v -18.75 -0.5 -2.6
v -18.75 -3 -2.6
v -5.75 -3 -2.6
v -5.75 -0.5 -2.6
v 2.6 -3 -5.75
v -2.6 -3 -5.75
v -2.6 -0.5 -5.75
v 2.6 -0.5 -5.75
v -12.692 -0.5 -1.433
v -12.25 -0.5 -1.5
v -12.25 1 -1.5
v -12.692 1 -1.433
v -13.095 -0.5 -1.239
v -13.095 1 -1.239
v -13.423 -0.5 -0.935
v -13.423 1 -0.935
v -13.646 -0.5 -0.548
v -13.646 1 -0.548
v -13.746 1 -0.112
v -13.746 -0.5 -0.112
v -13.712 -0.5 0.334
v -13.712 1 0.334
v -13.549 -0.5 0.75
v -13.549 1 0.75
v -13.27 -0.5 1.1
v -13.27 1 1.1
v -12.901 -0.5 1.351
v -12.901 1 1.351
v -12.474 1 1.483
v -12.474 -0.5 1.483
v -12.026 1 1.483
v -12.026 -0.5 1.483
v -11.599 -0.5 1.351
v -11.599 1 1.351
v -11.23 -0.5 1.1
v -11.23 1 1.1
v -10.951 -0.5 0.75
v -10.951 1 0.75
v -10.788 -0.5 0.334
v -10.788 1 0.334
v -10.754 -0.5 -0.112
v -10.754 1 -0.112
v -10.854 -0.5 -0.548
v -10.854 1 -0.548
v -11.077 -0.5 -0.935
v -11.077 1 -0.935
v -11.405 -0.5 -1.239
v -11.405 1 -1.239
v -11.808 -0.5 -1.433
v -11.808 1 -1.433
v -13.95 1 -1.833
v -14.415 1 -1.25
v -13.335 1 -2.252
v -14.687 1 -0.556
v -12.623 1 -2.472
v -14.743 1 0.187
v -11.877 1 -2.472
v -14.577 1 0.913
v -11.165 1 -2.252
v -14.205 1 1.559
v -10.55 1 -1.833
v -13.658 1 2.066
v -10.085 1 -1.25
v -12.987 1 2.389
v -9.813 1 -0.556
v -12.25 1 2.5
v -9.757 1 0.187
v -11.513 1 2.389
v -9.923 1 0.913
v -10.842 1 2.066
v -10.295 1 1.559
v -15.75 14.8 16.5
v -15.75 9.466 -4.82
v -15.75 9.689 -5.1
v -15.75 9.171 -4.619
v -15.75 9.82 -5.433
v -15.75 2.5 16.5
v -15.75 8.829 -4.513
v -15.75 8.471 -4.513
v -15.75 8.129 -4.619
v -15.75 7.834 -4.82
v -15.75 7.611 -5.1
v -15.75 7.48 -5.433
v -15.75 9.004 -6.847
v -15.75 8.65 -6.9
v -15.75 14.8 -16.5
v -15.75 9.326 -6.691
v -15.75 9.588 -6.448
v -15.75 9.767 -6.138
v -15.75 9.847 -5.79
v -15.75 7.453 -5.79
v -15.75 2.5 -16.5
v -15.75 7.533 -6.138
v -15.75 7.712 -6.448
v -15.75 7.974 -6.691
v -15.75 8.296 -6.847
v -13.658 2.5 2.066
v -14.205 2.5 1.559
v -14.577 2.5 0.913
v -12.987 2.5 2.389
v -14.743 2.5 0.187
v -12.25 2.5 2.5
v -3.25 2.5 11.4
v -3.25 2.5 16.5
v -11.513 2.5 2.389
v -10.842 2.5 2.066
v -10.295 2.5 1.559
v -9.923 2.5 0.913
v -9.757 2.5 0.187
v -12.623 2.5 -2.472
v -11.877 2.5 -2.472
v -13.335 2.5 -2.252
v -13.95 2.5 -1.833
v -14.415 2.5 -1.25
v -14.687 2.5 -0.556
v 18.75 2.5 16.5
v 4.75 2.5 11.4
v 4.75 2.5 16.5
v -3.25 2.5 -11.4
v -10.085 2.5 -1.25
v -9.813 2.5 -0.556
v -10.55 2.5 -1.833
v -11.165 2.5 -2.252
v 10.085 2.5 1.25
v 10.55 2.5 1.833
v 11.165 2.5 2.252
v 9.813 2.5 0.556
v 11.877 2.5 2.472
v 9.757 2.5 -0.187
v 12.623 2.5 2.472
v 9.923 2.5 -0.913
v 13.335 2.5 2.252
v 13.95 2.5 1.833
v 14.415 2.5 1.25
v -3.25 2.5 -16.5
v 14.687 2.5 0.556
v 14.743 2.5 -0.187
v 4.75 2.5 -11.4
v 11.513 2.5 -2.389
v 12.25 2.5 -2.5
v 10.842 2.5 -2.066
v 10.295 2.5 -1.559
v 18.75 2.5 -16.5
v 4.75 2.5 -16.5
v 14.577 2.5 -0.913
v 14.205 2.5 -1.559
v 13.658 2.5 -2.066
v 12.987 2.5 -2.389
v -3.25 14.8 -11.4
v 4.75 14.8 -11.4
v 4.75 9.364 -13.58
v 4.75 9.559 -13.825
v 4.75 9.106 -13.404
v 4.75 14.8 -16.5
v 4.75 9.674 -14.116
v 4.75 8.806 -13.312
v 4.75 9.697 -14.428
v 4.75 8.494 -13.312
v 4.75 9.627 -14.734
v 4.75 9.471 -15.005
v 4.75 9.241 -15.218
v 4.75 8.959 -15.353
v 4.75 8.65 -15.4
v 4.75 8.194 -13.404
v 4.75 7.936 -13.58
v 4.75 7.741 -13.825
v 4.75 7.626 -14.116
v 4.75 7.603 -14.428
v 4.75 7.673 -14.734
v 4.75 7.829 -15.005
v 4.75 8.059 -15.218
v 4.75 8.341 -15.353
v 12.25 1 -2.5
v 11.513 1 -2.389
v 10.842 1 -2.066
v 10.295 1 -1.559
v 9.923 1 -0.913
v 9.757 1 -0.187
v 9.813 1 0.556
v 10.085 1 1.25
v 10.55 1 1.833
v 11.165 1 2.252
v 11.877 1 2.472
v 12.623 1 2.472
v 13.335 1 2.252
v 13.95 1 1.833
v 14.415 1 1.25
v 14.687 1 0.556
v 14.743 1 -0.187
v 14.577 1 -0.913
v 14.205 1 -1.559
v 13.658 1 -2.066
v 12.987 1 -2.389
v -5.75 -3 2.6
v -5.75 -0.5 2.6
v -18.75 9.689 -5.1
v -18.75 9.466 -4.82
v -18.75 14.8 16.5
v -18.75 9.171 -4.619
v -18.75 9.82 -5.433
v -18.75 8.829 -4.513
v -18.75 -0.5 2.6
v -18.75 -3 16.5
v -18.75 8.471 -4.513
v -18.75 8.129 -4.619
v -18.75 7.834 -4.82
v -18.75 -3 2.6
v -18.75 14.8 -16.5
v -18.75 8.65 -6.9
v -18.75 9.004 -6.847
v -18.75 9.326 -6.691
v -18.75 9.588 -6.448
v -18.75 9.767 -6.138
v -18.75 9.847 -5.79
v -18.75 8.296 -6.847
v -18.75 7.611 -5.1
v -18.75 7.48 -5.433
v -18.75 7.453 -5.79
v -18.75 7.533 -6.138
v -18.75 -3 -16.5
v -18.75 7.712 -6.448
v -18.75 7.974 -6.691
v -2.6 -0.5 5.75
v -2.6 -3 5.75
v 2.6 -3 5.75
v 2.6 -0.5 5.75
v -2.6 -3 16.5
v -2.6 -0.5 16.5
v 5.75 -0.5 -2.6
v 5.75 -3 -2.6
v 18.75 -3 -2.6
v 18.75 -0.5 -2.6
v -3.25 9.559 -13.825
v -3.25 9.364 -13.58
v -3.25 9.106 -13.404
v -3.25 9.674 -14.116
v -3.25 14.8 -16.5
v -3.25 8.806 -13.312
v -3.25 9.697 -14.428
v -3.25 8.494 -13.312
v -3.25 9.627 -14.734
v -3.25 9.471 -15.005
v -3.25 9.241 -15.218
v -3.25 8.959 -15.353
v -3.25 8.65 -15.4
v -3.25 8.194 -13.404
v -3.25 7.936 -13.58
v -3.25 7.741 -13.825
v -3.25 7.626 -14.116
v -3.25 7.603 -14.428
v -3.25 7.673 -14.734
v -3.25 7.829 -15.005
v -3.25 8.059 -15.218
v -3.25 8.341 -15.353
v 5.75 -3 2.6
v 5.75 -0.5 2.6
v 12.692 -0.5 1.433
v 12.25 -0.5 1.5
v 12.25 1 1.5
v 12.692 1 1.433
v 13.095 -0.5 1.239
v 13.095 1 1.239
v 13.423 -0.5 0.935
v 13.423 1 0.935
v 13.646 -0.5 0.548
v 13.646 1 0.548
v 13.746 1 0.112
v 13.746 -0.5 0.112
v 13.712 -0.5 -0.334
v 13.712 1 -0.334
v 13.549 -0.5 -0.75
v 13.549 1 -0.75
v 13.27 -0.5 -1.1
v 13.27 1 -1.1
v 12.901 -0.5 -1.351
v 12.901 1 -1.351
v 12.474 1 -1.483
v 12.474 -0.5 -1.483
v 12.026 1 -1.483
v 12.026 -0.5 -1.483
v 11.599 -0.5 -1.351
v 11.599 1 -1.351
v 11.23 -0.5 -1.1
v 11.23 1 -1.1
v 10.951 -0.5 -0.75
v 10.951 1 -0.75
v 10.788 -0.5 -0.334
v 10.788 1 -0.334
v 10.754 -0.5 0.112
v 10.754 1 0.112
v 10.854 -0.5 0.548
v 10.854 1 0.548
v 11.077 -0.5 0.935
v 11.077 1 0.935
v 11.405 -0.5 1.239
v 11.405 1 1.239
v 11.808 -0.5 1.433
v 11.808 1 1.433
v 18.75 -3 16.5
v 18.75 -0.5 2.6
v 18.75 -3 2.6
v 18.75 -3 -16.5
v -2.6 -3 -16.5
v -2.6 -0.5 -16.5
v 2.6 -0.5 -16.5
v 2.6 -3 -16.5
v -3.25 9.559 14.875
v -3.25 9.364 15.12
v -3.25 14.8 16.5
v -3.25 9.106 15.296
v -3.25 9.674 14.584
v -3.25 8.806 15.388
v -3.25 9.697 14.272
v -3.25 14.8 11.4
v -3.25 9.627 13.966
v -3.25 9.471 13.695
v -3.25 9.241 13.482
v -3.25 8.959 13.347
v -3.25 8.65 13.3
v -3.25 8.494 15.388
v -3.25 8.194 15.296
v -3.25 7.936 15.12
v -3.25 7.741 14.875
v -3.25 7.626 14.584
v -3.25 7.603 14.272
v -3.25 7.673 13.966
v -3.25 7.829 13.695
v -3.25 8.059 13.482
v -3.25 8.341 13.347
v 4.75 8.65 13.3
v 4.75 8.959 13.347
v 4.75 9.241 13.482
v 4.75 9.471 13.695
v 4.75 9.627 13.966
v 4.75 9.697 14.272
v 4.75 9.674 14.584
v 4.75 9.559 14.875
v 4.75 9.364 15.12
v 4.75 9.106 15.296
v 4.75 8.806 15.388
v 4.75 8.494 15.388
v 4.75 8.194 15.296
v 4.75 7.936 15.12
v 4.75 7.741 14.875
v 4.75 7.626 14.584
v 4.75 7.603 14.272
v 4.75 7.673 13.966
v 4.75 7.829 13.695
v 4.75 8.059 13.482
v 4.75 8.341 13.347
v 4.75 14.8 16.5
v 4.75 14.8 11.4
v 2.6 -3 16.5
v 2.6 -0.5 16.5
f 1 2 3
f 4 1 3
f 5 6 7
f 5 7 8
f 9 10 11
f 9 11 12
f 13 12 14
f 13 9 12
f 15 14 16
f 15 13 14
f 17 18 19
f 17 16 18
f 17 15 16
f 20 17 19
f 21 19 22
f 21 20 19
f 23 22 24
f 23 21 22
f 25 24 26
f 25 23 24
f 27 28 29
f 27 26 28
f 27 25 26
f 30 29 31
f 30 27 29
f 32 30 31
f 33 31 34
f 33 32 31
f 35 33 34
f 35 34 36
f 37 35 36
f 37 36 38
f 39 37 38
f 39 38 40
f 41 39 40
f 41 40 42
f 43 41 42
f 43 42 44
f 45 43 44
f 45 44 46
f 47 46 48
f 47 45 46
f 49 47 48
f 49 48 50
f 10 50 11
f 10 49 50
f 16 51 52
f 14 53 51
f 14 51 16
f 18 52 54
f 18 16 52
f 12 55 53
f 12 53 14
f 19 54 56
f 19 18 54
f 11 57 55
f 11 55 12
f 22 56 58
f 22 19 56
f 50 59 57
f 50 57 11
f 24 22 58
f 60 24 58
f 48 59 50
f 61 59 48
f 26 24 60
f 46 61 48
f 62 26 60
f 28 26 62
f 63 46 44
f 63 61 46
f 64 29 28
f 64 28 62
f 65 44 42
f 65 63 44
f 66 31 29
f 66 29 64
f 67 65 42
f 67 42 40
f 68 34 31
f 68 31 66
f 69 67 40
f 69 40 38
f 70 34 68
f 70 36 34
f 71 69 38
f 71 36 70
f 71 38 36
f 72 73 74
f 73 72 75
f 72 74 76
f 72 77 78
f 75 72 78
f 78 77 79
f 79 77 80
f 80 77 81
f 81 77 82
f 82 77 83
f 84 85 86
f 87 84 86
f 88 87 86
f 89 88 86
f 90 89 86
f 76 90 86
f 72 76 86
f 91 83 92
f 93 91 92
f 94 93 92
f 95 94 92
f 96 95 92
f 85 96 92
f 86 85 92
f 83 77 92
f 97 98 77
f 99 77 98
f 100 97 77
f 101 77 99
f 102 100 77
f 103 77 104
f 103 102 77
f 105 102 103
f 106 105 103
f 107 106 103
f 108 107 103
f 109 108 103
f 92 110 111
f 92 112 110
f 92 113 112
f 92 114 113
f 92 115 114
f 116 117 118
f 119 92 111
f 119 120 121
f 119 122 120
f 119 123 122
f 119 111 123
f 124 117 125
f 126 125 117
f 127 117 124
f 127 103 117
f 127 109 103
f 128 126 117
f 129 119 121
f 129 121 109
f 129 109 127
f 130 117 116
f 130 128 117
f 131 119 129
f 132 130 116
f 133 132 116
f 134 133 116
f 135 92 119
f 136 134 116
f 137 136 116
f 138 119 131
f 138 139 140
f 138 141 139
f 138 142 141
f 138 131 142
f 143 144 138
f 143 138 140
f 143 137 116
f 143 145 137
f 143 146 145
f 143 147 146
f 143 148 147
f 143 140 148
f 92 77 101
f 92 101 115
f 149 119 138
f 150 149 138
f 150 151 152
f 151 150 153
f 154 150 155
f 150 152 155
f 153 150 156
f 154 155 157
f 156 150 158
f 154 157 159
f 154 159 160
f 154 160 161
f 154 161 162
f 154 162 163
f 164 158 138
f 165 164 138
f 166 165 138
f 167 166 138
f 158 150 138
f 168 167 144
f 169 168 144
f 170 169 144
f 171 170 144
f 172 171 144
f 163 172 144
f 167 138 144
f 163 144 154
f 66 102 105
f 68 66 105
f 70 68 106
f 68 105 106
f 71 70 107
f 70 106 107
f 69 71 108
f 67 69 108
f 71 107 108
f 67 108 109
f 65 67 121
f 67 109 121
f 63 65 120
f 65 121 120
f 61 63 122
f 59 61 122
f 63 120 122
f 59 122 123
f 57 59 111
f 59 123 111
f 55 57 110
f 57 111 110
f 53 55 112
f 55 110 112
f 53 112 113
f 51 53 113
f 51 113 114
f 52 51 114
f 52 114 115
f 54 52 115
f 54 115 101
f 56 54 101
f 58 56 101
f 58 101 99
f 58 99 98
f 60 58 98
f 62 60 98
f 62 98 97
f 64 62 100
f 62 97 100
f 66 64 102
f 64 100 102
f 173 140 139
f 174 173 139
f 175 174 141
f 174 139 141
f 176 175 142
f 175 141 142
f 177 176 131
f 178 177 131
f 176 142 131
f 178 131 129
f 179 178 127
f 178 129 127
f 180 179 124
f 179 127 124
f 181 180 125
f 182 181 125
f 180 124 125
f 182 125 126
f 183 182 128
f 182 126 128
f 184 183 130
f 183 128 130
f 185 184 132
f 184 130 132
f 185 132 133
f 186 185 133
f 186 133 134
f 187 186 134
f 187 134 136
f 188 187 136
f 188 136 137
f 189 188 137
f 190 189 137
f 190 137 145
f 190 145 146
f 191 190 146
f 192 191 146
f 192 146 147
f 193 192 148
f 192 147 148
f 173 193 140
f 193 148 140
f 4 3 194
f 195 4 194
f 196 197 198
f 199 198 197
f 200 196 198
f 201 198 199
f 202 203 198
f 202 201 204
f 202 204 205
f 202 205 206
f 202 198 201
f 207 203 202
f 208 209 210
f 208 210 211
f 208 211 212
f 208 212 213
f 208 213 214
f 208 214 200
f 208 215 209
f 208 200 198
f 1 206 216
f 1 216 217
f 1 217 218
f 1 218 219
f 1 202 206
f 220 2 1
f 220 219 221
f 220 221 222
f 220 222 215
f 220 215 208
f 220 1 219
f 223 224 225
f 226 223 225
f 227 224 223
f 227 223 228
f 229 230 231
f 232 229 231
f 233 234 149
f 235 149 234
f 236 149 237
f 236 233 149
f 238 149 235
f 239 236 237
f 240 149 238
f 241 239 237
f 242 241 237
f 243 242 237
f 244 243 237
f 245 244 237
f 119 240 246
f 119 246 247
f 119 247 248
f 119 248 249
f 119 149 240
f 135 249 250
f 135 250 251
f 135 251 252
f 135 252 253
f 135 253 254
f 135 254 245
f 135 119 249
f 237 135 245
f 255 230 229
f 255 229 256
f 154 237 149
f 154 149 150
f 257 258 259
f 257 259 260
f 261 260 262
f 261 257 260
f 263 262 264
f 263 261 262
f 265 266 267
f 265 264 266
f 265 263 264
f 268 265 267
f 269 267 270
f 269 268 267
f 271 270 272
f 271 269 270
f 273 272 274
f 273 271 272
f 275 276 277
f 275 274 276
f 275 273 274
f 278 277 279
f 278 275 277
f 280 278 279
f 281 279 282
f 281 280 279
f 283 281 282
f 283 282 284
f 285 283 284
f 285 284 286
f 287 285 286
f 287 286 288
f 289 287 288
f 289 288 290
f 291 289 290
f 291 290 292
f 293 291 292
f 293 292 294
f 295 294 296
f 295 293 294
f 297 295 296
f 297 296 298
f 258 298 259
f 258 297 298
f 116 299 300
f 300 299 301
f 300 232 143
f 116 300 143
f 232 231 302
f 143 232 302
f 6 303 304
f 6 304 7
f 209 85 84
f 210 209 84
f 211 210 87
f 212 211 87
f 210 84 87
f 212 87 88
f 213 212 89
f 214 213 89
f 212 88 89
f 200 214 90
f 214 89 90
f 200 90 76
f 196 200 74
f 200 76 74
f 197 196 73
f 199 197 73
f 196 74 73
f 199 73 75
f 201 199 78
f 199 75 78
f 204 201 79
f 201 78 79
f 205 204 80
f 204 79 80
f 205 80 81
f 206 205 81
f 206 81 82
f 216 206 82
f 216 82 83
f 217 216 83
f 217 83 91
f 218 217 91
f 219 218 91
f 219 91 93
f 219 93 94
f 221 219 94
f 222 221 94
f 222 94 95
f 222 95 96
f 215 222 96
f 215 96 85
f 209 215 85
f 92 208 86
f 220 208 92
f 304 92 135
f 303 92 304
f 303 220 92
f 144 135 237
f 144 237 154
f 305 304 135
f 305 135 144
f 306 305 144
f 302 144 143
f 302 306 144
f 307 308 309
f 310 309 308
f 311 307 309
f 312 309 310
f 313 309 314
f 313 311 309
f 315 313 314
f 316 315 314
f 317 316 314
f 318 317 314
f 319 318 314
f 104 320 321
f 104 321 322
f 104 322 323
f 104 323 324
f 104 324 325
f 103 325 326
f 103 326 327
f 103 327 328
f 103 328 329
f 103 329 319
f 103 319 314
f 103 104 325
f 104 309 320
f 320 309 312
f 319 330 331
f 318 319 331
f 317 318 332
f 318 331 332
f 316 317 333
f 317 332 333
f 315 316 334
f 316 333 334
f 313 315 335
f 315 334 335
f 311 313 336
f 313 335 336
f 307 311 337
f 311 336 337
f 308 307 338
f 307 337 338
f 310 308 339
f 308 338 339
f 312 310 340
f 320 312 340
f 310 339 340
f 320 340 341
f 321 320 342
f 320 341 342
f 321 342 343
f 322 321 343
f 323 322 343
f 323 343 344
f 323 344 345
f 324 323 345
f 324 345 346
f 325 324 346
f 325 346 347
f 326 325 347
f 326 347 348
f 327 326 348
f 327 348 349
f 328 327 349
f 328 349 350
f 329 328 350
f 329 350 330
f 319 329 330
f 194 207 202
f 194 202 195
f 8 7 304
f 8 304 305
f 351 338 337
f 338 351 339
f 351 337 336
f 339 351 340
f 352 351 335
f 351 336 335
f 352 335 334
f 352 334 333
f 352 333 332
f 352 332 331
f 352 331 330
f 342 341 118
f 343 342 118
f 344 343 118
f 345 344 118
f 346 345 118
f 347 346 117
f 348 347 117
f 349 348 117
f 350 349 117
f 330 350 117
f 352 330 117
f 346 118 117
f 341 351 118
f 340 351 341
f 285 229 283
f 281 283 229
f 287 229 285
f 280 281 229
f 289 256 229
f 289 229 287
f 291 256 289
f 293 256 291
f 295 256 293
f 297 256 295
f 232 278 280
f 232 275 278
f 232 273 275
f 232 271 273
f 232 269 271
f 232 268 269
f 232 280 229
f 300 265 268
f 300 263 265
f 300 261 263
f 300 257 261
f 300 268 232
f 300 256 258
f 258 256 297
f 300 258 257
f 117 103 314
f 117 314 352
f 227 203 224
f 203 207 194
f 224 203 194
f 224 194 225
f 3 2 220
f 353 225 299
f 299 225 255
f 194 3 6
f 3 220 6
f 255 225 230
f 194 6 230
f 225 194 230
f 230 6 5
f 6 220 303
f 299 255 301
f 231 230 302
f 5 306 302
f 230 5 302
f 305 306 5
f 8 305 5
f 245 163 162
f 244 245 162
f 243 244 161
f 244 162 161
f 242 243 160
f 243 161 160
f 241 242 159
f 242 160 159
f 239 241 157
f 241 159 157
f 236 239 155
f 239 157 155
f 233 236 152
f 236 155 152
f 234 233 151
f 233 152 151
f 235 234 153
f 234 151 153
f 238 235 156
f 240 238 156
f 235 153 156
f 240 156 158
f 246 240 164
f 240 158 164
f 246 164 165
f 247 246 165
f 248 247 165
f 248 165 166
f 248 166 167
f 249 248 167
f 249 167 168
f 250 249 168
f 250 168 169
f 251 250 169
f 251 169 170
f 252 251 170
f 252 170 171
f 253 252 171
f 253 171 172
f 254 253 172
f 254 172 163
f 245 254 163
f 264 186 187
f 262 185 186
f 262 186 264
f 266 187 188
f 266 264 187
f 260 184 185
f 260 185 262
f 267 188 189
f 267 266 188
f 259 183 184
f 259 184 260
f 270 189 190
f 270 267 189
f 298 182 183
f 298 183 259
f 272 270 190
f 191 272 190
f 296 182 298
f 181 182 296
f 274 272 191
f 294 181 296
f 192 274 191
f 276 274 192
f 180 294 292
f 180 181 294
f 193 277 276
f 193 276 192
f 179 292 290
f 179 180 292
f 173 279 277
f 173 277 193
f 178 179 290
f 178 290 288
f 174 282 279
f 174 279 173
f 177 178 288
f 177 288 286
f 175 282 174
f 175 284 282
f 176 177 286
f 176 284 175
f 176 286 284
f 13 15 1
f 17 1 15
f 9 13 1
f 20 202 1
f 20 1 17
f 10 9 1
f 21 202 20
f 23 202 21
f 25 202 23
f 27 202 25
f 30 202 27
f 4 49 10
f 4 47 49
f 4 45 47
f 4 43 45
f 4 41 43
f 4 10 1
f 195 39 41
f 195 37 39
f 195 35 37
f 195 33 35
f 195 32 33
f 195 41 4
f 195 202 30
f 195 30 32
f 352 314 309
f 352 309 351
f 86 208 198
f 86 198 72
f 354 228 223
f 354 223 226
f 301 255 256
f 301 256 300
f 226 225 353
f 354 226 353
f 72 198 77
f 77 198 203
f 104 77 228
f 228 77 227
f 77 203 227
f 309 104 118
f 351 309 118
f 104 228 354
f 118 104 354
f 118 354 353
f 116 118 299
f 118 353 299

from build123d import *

# Parameters (mm, degrees)
AUFSATZ_LINEAR_AUSTRAGEN1_DEPTH      = 2.5
AUFSATZ_LINEAR_AUSTRAGEN1_DEPTH_BACK = 3
SKIZZE1_W                            = 37.5
SKIZZE1_H                            = 33
SKIZZE2_W                            = 3
SKIZZE2_H                            = 33
SKIZZE2_W_2                          = 8
SKIZZE2_H_2                          = 5.1
AUFSATZ_LINEAR_AUSTRAGEN2_DEPTH      = 12.3
SKIZZE5_R                            = 1.2
SCHNITT_LINEAR_AUSTRAGEN4_DEPTH      = 42.006584837
SKIZZE7_R                            = 1.05
SCHNITT_LINEAR_AUSTRAGEN5_DEPTH      = 10
SKIZZE8_W                            = 5.2
SKIZZE8_H                            = 13
SKIZZE8_W_2                          = 13
SKIZZE8_H_2                          = 5.2
SCHNITT_LINEAR_AUSTRAGEN6_DEPTH      = 2.5
SCHNITT_LINEAR_AUSTRAGEN7_DEPTH      = 30.031922086
SCHNITT_LINEAR_AUSTRAGEN7_DEPTH_BACK = 30.031922086
SKIZZE10_R                           = 1.5
SKIZZE13_R                           = 2.5
SCHNITT_LINEAR_AUSTRAGEN8_DEPTH      = 1.5


with BuildPart() as part:
    # Skizze1 → Aufsatz-Linear austragen1 (new, two sides: drawn at the far end of the back side and taken through both)
    with BuildSketch(Plane(origin=(0, 0, 0), x_dir=(1, 0, 0), z_dir=(0, 1, 0)).offset(-AUFSATZ_LINEAR_AUSTRAGEN1_DEPTH_BACK)):
        Rectangle(SKIZZE1_W, SKIZZE1_H)
    extrude(amount=AUFSATZ_LINEAR_AUSTRAGEN1_DEPTH + AUFSATZ_LINEAR_AUSTRAGEN1_DEPTH_BACK)

    # Skizze2 → Aufsatz-Linear austragen2 (add)
    with BuildSketch(Plane(origin=(0, 2.5, 0), x_dir=(1, 0, 0), z_dir=(0, 1, 0))):
        with Locations((-17.25, 0)):
            Rectangle(SKIZZE2_W, SKIZZE2_H)
        with Locations((0.75, -13.95)):
            Rectangle(SKIZZE2_W_2, SKIZZE2_H_2)
        with Locations((0.75, 13.95)):
            Rectangle(SKIZZE2_W_2, SKIZZE2_H_2)
    extrude(amount=AUFSATZ_LINEAR_AUSTRAGEN2_DEPTH)

    # Skizze5 → Schnitt-Linear austragen4 (cut, through all)
    with BuildSketch(Plane(origin=(-15.75, 0, 0), x_dir=(0, 0, -1), z_dir=(1, 0, 0))):
        with Locations((5.7, 8.65)):
            Circle(SKIZZE5_R)
    extrude(amount=-SCHNITT_LINEAR_AUSTRAGEN4_DEPTH, mode=Mode.SUBTRACT)

    # Skizze7 → Schnitt-Linear austragen5 (cut)
    with BuildSketch(Plane(origin=(4.75, 0, 0), x_dir=(0, 0, -1), z_dir=(1, 0, 0))):
        with Locations((-14.35, 8.65)):
            Circle(SKIZZE7_R)
        with Locations((14.35, 8.65)):
            Circle(SKIZZE7_R)
    extrude(amount=-SCHNITT_LINEAR_AUSTRAGEN5_DEPTH, mode=Mode.SUBTRACT)

    # Skizze8 → Schnitt-Linear austragen6 (cut)
    with BuildSketch(Plane.XZ.offset(3)):
        with Locations((5.277e-06, -12.250005277)):
            Rectangle(SKIZZE8_W, SKIZZE8_H)
        with Locations((12.25, 0)):
            Rectangle(SKIZZE8_W_2, SKIZZE8_H_2)
        with Locations((-12.25, -1.0555e-05)):
            Rectangle(SKIZZE8_W_2, SKIZZE8_H_2)
        with Locations((-5.277e-06, 12.249994723)):
            Rectangle(SKIZZE8_W, SKIZZE8_H)
    extrude(amount=-SCHNITT_LINEAR_AUSTRAGEN6_DEPTH, mode=Mode.SUBTRACT)

    # Skizze10 → Schnitt-Linear austragen7 (cut, two sides: drawn at the far end of the back side and taken through both)
    with BuildSketch(Plane(origin=(0, 0, 0), x_dir=(-1, 0, 0), z_dir=(0, 1, 0)).offset(-SCHNITT_LINEAR_AUSTRAGEN7_DEPTH_BACK)):
        with Locations(Location((-12.25, 0, 0), (0, 0, 90))):
            Circle(SKIZZE10_R)
        with Locations(Location((12.25, 0, 0), (0, 0, 270))):
            Circle(SKIZZE10_R)
    extrude(amount=SCHNITT_LINEAR_AUSTRAGEN7_DEPTH + SCHNITT_LINEAR_AUSTRAGEN7_DEPTH_BACK, mode=Mode.SUBTRACT)

    # Skizze13 → Schnitt-Linear austragen8 (cut)
    with BuildSketch(Plane(origin=(0, 2.5, 0), x_dir=(-1, 0, 0), z_dir=(0, 1, 0))):
        with Locations(Location((12.25, 0, 0), (0, 0, 90))):
            Circle(SKIZZE13_R)
        with Locations(Location((-12.25, 0, 0), (0, 0, 270))):
            Circle(SKIZZE13_R)
    extrude(amount=-SCHNITT_LINEAR_AUSTRAGEN8_DEPTH, mode=Mode.SUBTRACT)


solid = part.part
